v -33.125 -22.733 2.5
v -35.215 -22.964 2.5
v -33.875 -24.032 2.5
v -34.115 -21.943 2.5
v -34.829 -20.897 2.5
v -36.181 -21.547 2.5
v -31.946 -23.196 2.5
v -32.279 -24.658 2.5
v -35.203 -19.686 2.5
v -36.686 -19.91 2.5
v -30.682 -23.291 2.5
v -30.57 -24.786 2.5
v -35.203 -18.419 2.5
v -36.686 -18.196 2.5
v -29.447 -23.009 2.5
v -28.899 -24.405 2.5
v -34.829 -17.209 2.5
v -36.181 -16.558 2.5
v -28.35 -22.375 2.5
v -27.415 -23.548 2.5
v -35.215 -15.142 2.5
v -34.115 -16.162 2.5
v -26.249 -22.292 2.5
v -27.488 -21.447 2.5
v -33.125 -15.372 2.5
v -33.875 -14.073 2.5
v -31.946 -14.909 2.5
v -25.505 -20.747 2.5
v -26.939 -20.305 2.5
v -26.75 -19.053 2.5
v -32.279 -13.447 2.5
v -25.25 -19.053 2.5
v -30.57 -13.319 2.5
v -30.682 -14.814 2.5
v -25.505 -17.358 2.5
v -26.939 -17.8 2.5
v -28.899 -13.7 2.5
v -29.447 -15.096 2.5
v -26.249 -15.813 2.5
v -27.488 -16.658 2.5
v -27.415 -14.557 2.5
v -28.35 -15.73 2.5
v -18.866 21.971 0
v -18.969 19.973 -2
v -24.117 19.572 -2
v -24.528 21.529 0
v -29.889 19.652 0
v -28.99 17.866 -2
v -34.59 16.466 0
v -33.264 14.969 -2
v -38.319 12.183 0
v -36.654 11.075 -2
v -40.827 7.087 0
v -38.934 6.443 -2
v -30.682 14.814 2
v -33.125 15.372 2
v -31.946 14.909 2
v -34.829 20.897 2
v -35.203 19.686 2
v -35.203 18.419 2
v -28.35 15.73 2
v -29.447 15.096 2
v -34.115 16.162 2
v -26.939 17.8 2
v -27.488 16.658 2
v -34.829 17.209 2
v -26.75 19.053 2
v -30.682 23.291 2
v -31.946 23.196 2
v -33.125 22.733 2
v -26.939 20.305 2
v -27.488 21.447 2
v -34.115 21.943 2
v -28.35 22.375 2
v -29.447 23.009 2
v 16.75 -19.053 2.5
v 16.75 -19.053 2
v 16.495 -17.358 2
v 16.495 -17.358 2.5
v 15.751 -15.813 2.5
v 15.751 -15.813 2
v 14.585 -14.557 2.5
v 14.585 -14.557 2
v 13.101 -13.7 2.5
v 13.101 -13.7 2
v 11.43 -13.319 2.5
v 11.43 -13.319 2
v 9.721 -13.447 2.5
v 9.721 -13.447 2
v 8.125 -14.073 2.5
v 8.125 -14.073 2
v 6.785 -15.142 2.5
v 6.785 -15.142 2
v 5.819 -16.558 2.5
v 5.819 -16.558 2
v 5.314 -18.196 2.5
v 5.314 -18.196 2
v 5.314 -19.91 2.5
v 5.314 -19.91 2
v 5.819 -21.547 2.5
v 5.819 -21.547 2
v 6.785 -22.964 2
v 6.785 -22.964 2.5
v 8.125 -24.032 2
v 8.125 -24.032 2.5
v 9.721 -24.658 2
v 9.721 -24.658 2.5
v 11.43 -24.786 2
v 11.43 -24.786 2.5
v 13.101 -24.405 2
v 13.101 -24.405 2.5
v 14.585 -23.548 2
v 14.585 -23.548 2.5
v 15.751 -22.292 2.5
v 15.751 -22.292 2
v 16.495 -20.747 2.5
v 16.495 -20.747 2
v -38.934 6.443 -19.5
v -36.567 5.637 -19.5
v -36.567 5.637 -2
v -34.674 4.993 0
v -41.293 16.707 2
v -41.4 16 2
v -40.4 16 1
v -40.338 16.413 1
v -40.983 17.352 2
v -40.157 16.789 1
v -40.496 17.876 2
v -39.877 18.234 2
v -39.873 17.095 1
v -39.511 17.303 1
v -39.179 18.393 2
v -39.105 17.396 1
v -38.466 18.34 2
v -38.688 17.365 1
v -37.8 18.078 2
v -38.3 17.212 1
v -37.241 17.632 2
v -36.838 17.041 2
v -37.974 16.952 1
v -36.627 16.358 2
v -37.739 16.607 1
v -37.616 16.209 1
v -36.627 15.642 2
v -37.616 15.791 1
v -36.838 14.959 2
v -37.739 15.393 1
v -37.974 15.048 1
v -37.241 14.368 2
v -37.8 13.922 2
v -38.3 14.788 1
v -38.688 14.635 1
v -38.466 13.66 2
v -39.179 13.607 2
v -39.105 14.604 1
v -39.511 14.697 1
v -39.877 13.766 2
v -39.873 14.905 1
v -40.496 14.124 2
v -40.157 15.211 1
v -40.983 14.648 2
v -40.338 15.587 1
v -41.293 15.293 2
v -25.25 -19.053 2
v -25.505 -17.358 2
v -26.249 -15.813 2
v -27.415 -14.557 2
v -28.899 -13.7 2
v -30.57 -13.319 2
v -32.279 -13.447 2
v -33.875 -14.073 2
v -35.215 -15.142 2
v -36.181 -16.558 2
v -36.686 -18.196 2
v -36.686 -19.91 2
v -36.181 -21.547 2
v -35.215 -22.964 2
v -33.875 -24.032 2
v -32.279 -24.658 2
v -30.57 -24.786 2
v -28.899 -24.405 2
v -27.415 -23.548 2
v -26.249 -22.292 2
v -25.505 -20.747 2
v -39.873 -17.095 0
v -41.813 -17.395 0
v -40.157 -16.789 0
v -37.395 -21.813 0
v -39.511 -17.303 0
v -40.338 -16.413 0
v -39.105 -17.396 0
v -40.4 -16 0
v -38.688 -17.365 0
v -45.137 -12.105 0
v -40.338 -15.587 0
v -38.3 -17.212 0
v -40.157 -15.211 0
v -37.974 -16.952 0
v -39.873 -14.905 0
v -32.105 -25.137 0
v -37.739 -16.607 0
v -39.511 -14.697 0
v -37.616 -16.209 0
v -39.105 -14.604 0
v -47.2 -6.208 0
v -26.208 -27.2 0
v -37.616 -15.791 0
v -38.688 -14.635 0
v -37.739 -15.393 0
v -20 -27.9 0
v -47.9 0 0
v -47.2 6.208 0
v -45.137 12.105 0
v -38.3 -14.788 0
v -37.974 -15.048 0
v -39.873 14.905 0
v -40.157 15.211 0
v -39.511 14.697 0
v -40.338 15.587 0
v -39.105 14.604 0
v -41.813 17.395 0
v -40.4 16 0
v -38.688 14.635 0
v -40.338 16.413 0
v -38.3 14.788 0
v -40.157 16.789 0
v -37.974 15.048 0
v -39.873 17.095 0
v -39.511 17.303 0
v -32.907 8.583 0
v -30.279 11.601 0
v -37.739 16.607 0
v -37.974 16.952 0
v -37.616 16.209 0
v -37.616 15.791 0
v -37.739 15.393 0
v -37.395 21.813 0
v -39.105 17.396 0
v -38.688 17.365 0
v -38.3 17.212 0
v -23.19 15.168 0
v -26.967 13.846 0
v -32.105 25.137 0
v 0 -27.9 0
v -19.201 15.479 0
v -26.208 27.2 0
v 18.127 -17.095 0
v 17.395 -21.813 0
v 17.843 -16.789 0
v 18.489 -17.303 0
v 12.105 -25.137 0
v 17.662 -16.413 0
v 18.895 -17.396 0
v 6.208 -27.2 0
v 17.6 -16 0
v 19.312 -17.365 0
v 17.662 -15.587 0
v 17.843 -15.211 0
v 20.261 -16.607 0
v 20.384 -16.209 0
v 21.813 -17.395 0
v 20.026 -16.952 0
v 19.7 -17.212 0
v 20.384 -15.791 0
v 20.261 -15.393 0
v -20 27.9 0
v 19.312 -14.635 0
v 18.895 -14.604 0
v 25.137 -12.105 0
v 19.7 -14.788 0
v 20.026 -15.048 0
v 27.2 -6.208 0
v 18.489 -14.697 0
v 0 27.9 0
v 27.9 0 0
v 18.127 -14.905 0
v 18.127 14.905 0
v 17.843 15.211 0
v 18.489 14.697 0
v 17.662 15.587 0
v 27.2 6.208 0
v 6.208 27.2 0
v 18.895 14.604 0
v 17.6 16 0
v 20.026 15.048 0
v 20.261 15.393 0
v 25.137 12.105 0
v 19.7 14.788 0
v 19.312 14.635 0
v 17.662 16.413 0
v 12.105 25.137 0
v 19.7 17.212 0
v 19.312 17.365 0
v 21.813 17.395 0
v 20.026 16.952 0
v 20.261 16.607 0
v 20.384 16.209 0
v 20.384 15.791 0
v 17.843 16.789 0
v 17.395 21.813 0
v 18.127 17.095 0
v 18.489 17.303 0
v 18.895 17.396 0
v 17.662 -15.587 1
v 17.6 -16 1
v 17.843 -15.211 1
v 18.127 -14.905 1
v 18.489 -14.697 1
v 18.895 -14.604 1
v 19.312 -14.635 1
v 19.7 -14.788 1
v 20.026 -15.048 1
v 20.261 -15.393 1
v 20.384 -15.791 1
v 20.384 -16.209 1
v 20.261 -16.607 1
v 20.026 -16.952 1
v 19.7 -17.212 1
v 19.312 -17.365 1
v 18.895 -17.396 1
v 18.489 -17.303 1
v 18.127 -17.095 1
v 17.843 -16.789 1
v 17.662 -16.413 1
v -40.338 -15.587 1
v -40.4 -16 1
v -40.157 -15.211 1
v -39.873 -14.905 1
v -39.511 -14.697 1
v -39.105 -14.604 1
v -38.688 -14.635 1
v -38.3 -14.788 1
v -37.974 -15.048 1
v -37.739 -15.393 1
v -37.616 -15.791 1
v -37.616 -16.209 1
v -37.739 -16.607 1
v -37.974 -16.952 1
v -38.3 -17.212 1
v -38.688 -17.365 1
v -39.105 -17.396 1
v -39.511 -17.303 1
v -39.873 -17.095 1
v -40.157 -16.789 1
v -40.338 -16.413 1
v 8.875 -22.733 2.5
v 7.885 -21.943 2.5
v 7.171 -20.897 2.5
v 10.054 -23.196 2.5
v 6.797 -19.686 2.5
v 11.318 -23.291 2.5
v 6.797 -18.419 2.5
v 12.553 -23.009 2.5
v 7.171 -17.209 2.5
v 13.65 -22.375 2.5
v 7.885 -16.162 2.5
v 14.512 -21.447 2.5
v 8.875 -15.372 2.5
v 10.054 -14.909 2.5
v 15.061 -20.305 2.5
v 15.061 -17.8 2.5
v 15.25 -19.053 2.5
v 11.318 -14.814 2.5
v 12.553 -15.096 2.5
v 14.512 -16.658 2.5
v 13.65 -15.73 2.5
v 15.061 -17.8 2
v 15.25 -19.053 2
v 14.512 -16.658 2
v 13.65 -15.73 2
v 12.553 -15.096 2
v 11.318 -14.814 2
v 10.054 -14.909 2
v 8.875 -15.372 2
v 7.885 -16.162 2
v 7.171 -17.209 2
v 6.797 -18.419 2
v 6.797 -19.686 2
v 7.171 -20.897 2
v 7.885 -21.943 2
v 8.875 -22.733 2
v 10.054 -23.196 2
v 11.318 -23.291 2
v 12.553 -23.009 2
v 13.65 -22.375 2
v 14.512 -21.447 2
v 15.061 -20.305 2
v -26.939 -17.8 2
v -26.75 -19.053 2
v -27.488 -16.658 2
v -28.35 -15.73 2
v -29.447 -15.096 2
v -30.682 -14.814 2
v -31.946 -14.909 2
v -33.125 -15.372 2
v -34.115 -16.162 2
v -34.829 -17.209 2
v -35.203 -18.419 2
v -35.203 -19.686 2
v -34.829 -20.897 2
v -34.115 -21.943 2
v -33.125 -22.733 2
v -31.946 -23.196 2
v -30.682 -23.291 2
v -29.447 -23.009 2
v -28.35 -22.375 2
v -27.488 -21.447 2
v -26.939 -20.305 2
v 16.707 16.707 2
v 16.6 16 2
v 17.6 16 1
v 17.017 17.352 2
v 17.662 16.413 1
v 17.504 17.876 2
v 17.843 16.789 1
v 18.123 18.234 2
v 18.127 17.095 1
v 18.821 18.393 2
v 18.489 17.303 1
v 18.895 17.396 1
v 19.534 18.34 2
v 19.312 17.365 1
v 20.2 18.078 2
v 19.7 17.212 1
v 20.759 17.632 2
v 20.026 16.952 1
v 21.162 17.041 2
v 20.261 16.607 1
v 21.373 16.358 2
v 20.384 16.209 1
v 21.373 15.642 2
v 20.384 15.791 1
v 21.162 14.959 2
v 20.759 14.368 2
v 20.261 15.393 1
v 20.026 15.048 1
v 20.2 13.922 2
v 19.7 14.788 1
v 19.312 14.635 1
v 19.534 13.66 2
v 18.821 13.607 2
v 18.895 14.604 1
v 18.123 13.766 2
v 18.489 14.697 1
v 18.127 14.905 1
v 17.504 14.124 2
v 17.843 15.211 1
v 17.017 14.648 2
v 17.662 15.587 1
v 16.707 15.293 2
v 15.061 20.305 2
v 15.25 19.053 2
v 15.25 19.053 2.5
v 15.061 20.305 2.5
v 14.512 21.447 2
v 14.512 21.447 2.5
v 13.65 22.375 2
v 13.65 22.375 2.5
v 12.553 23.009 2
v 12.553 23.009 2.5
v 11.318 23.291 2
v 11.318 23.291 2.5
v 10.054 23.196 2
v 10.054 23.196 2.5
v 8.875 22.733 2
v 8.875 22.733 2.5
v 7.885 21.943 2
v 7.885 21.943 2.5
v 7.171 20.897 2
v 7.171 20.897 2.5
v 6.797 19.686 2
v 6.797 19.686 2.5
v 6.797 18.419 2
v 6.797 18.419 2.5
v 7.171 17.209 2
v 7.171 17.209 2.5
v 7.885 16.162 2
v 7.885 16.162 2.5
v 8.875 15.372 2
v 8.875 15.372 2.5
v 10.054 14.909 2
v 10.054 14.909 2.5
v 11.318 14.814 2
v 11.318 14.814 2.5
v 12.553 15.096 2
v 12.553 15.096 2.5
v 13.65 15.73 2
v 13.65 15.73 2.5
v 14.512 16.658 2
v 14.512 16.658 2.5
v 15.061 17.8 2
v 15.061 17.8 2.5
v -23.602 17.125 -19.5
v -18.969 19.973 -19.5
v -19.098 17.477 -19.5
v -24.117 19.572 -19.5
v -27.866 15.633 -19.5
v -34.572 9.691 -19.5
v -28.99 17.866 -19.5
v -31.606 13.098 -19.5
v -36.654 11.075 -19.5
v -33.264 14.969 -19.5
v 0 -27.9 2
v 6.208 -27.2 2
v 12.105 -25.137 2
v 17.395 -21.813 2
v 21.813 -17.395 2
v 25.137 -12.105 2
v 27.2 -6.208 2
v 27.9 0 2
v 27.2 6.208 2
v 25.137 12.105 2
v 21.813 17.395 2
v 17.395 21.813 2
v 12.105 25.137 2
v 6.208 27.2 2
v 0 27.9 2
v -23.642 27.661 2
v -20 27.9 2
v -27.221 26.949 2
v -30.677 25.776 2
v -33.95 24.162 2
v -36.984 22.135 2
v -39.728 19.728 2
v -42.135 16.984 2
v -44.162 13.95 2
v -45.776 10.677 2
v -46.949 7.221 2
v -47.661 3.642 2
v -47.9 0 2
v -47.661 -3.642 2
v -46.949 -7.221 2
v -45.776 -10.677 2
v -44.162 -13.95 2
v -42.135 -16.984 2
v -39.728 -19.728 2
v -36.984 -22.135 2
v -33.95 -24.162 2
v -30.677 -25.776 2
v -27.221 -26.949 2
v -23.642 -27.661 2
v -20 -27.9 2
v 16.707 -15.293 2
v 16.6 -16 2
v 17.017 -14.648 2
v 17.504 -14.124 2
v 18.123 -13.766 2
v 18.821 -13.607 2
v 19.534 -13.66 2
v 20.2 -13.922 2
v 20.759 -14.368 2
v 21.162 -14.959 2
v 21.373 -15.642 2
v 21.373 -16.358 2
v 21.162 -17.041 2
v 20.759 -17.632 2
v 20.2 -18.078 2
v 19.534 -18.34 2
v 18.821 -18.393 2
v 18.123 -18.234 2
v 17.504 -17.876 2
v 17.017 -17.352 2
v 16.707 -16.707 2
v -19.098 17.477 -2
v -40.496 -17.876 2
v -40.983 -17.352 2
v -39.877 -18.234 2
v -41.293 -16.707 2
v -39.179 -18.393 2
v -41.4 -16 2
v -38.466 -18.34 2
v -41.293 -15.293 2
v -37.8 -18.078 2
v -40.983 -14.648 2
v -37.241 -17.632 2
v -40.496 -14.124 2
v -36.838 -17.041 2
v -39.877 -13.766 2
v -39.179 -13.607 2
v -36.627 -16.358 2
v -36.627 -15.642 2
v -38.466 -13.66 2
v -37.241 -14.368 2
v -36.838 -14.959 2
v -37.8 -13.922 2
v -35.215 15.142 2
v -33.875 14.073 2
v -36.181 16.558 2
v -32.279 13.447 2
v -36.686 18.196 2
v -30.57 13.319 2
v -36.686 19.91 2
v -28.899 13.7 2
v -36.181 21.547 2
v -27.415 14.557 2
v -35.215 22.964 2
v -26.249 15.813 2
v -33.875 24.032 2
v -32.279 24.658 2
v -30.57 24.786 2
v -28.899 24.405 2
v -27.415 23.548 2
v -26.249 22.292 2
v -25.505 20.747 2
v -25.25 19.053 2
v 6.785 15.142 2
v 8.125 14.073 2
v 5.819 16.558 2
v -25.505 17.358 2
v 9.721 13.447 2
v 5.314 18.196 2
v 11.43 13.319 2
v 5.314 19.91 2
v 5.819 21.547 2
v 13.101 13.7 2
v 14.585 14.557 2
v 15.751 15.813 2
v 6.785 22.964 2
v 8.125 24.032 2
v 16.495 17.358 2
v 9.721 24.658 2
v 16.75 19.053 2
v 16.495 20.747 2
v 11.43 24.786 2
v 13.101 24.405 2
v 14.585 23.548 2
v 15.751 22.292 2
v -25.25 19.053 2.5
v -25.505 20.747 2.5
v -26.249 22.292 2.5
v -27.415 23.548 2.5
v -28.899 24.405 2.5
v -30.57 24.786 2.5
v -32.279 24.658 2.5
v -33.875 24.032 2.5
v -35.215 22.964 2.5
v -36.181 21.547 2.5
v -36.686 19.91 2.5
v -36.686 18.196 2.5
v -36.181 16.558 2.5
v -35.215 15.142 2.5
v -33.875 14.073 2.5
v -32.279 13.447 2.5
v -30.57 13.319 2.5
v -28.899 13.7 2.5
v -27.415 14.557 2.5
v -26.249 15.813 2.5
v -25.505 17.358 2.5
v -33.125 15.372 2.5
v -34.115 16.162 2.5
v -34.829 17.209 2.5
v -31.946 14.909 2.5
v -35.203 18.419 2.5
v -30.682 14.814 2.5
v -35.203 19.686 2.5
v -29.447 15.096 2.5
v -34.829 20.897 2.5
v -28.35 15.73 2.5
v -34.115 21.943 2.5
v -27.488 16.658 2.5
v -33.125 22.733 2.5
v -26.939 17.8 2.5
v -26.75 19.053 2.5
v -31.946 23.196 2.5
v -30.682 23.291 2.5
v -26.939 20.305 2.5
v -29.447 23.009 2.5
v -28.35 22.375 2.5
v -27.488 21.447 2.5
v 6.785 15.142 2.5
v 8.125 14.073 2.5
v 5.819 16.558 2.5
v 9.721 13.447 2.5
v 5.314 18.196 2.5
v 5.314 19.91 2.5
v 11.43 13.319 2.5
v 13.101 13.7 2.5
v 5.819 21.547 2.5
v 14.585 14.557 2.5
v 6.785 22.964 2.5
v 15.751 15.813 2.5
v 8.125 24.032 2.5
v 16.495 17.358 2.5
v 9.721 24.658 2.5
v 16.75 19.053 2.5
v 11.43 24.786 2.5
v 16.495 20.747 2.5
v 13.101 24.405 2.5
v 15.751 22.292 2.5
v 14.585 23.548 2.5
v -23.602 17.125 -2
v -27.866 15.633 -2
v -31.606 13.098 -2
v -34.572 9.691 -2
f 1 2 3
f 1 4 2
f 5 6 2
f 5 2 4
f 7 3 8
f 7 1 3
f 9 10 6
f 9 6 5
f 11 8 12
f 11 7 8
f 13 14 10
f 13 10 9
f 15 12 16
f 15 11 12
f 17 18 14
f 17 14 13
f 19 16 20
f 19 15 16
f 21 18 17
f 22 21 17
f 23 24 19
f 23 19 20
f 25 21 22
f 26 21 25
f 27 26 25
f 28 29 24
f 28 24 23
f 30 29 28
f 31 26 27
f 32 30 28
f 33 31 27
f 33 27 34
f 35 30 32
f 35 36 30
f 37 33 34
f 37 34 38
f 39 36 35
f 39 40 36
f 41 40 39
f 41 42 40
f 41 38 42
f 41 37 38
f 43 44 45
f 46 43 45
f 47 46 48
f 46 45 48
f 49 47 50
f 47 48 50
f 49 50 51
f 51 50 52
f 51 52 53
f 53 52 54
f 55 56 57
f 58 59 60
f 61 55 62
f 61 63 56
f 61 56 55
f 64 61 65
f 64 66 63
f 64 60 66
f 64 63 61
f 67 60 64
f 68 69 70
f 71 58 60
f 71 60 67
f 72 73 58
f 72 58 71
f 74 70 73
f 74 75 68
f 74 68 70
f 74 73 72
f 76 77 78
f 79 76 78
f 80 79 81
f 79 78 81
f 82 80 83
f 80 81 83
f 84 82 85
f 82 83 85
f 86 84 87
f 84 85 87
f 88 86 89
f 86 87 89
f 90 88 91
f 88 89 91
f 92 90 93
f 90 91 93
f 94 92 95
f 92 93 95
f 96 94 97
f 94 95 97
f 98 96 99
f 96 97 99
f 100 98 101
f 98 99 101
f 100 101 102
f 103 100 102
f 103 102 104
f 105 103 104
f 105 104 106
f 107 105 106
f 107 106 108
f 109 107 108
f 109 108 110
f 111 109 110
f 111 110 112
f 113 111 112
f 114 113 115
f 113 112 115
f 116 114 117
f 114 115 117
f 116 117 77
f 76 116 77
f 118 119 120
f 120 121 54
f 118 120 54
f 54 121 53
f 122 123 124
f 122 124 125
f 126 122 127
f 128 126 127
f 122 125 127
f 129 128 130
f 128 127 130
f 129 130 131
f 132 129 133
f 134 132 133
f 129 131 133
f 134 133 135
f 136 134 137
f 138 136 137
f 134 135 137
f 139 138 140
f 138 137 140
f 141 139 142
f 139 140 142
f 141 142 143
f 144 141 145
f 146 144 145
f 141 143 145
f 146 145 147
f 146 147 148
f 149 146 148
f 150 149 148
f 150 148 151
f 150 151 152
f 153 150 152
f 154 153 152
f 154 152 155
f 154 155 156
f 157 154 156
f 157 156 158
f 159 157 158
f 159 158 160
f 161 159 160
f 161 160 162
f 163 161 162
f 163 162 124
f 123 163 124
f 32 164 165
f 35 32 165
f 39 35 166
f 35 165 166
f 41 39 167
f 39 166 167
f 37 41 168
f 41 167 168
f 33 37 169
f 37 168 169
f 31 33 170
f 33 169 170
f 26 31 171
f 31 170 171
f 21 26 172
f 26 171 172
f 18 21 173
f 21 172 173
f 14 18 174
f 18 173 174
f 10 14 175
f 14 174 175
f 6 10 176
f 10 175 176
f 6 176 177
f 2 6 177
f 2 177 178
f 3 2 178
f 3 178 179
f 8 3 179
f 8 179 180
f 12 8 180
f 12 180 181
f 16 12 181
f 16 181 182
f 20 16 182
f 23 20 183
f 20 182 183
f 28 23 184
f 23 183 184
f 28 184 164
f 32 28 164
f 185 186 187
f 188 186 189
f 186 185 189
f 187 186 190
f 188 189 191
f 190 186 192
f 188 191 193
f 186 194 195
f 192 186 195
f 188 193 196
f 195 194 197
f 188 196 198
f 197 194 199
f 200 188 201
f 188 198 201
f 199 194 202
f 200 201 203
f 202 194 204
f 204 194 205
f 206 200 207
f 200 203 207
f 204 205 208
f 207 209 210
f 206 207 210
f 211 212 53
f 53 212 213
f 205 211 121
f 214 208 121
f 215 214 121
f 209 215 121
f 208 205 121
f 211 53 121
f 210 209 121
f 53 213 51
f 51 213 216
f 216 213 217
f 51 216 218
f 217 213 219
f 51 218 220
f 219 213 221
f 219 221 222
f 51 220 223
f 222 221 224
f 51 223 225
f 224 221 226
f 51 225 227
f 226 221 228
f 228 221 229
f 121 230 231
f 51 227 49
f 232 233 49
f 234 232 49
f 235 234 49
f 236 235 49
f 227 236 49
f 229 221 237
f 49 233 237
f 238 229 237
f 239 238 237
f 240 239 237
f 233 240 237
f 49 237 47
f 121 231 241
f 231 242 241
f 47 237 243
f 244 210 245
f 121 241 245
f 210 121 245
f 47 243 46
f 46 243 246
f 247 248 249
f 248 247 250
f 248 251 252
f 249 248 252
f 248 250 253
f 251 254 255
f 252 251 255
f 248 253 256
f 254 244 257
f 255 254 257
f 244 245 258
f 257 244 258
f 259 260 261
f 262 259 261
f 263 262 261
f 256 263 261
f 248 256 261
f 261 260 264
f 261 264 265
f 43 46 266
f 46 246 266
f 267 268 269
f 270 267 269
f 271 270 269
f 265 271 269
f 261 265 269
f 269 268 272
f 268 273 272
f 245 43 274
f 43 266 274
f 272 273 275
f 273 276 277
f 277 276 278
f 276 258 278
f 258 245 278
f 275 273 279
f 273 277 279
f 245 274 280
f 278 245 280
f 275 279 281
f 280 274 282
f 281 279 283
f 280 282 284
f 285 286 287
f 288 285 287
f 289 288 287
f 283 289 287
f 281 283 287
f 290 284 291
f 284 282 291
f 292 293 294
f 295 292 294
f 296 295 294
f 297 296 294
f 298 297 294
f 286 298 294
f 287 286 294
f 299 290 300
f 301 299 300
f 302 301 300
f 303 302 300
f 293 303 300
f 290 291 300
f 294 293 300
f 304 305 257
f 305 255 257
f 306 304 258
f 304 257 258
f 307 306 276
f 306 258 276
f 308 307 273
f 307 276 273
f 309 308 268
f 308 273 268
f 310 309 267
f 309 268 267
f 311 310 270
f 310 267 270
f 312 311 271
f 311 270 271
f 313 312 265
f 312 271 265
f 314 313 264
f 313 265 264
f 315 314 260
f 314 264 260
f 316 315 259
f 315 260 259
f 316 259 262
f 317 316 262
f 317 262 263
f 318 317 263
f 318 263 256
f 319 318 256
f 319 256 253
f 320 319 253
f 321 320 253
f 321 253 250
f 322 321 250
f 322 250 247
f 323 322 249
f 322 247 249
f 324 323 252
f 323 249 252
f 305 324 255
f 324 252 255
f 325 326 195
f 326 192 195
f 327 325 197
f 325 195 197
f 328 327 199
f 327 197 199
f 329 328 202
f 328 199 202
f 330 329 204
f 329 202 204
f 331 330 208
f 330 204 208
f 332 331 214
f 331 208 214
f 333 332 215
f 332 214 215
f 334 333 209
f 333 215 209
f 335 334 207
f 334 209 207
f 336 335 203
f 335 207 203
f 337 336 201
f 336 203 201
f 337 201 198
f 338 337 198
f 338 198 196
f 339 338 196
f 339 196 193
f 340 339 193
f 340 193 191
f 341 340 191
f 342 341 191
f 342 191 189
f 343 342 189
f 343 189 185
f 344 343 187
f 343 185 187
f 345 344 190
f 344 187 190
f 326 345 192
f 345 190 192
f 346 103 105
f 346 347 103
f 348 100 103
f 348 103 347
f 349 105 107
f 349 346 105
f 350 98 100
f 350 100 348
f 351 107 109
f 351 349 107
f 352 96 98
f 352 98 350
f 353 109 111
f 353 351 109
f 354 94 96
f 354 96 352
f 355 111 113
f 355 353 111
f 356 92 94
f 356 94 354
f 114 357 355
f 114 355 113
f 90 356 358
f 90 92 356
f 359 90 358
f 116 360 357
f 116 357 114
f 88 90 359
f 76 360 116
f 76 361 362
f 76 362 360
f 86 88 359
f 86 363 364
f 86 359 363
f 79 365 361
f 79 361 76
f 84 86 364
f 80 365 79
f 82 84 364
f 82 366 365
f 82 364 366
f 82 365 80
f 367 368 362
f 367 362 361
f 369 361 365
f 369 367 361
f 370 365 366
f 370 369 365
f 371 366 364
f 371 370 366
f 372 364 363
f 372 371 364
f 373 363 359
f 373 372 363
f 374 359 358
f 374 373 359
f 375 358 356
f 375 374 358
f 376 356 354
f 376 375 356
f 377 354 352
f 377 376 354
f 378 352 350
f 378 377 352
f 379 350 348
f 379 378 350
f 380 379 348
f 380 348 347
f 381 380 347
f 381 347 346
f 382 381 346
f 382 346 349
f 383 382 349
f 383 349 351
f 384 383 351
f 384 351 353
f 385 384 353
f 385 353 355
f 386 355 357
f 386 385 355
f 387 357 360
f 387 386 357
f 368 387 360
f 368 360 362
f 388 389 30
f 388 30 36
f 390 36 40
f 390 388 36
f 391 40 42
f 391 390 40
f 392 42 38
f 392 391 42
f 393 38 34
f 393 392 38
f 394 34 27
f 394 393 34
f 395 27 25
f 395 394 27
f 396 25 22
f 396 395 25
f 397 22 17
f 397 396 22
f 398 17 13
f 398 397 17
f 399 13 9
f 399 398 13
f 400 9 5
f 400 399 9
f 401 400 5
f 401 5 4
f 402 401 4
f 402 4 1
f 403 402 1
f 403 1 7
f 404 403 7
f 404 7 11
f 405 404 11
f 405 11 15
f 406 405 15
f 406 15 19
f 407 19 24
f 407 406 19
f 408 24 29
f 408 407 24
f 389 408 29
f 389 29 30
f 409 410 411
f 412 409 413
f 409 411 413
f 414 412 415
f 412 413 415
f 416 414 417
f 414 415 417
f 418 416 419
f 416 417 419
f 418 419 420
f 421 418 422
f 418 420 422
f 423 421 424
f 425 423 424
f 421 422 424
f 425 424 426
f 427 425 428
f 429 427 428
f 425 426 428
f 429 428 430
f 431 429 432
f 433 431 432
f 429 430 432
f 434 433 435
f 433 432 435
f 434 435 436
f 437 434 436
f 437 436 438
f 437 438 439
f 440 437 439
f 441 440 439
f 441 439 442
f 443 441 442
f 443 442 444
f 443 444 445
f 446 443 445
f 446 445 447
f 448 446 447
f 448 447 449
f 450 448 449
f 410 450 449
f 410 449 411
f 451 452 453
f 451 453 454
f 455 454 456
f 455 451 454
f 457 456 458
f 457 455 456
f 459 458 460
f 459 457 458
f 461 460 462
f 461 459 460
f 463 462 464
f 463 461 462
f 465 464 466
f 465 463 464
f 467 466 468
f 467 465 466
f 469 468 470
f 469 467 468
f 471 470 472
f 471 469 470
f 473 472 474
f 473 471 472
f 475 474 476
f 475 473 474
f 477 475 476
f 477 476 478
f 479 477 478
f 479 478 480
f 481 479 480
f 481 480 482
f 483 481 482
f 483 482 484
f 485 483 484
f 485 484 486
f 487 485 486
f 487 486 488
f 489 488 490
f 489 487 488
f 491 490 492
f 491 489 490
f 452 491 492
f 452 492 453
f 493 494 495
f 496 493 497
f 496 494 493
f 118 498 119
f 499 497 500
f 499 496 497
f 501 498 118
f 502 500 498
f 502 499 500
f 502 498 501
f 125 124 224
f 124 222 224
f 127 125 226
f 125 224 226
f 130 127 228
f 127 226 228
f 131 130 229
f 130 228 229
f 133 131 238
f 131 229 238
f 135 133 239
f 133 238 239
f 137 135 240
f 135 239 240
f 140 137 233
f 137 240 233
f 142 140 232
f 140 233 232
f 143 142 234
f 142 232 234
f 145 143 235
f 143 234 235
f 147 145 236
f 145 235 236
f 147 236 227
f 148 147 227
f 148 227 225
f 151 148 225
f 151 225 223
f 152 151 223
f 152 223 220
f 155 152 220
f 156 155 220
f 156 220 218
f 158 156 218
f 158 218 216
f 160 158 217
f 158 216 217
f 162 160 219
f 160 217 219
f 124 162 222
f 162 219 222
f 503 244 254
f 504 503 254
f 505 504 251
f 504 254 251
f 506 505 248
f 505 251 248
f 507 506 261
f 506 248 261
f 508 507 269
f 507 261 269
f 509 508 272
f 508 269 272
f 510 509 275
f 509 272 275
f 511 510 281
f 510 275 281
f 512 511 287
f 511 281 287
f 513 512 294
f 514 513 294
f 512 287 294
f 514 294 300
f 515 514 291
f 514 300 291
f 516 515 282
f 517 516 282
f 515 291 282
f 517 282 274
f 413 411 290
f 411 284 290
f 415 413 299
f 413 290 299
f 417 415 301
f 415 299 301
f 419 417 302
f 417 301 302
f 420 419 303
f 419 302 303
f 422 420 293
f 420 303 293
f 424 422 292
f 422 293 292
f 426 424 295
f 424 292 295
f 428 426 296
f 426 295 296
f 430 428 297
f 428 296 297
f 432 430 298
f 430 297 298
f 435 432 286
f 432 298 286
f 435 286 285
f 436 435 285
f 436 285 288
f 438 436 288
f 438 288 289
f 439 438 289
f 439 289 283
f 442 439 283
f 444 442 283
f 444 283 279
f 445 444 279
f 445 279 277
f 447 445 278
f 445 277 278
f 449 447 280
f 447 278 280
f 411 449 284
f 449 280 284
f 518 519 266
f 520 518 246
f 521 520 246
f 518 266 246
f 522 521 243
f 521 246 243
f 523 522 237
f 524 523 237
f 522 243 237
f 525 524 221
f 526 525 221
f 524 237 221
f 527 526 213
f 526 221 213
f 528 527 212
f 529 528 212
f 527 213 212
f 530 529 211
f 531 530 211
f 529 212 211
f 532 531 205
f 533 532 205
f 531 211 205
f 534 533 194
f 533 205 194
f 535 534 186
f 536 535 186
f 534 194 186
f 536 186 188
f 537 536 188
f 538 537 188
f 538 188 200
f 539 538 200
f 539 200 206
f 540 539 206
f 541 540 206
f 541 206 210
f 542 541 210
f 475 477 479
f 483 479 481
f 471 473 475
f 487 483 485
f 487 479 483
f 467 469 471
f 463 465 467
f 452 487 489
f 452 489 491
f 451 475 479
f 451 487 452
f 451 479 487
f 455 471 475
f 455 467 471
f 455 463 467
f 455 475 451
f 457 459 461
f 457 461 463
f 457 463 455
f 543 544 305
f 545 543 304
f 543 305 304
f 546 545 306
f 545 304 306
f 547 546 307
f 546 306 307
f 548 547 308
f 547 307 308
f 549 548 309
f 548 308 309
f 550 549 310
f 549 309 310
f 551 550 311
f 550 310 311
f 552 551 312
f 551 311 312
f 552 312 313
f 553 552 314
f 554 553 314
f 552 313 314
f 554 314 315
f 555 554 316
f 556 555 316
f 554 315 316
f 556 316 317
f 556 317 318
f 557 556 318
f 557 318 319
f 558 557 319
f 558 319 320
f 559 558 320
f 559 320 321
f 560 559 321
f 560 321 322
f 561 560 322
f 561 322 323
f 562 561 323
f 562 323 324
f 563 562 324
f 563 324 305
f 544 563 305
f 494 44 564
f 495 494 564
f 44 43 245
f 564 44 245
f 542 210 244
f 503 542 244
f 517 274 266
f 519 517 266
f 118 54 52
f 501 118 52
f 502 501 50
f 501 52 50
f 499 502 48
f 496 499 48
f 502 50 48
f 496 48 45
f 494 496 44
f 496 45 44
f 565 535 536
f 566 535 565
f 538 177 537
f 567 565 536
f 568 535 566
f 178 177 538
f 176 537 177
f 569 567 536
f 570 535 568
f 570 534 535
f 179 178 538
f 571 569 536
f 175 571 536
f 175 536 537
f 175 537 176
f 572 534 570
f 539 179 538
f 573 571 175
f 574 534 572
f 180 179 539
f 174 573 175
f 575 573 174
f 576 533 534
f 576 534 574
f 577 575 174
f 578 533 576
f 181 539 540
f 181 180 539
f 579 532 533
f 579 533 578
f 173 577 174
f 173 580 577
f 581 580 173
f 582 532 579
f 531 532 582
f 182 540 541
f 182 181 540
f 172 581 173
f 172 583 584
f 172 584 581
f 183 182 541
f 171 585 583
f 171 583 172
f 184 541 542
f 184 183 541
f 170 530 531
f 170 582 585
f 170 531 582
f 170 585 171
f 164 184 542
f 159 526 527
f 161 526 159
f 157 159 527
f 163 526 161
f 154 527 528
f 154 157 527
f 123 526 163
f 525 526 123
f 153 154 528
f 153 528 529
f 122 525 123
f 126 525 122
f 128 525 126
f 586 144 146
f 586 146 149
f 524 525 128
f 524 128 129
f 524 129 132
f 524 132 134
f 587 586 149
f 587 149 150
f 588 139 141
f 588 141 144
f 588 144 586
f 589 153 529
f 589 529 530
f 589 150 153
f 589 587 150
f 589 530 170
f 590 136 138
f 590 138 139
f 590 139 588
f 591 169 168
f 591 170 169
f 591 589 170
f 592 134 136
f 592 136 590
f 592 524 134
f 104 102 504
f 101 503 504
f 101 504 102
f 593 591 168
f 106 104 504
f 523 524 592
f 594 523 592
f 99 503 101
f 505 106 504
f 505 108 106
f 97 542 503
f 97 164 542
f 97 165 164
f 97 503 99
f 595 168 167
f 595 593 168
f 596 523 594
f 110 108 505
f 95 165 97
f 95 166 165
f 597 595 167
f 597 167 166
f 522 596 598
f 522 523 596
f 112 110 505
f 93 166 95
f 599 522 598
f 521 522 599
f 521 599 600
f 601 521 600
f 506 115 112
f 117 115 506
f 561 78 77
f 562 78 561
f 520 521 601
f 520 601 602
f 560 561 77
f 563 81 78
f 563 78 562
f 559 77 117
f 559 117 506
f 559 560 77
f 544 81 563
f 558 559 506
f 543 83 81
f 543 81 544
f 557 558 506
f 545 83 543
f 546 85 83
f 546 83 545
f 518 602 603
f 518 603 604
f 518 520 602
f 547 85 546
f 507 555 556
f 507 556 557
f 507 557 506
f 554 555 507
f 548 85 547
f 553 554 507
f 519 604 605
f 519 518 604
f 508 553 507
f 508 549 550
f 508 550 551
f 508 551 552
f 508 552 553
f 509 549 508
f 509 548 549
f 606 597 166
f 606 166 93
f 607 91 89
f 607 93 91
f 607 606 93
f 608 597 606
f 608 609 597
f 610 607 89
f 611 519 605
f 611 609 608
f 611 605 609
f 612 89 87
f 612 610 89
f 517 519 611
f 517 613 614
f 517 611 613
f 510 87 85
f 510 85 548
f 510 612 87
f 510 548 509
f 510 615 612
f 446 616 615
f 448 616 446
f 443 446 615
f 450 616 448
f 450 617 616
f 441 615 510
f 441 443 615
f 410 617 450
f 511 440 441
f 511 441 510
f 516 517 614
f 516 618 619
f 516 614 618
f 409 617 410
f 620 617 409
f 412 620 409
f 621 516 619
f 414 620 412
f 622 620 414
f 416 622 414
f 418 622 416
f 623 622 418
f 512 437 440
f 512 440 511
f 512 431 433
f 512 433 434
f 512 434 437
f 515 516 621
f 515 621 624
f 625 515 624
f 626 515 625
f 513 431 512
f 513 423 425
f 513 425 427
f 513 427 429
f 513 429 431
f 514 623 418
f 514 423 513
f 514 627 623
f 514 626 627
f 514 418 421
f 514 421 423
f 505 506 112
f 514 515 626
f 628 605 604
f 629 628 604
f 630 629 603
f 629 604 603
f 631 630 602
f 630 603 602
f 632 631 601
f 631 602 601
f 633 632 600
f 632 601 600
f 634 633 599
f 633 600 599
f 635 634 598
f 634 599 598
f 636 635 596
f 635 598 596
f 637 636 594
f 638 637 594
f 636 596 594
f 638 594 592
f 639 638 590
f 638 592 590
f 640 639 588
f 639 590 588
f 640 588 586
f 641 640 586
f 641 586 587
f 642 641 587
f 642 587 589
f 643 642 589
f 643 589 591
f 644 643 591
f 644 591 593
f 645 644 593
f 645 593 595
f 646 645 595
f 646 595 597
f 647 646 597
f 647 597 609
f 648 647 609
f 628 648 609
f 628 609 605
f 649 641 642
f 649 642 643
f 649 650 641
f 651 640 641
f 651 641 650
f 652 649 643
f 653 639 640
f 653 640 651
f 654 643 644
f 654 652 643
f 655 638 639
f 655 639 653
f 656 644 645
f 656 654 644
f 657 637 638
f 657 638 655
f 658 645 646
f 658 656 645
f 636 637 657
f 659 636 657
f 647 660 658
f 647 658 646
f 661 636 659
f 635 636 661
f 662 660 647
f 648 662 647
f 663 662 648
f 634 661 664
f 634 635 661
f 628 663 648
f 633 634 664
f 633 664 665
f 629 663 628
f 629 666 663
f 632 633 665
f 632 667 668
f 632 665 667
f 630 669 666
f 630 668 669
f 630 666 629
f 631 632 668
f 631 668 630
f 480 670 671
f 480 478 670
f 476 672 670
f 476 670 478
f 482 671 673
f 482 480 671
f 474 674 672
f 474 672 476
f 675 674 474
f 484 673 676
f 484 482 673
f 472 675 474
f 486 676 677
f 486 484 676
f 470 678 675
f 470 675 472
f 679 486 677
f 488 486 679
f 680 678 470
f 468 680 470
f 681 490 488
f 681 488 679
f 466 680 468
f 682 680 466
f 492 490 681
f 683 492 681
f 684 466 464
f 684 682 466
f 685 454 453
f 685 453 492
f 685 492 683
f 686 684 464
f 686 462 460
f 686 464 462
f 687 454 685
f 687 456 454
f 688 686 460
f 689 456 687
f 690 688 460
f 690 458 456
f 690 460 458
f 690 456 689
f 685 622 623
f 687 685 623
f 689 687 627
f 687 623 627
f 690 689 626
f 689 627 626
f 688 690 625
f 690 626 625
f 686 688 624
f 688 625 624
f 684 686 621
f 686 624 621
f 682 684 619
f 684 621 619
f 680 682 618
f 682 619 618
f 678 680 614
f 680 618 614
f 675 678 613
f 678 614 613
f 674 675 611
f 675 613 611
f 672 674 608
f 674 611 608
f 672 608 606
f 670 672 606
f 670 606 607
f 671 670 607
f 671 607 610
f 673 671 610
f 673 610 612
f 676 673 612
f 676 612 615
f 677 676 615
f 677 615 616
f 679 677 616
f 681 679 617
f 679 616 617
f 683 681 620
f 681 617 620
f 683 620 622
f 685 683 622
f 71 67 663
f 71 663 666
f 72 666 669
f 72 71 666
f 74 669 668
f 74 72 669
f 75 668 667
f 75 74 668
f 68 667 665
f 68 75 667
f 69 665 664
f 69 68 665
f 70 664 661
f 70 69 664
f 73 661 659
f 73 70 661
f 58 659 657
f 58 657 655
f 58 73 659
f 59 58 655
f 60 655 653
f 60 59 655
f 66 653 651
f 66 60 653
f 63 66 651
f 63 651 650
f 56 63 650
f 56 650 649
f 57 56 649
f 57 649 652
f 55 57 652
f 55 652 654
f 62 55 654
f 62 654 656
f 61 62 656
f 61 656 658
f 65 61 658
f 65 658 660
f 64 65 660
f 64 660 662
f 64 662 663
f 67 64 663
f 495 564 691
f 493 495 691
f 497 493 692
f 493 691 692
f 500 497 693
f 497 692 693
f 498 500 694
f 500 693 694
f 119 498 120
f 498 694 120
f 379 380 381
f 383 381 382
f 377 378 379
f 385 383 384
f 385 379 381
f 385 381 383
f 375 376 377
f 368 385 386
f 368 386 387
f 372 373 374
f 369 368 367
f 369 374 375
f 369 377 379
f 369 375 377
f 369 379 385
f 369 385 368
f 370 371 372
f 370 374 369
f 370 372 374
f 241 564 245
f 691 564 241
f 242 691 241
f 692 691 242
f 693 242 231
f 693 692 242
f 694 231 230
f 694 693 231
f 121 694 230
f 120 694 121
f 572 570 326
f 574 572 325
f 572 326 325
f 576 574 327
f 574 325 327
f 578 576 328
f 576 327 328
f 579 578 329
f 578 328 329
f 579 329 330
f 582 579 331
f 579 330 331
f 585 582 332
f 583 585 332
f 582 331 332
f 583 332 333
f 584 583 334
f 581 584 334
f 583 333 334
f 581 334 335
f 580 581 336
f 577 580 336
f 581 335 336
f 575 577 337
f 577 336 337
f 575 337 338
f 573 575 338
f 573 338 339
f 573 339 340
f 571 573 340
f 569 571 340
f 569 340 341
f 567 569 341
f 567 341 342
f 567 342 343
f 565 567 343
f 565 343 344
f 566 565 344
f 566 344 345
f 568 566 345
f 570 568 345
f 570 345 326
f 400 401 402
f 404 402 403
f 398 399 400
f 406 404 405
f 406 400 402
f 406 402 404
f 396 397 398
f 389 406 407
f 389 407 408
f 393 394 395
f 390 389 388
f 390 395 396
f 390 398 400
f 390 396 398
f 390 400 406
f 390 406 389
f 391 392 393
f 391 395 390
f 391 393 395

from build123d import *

# Parameters (mm, degrees)
EXTRUDE_1_DEPTH           = 2
HOLE_WIZARD_1_D           = 2.8
HOLE_WIZARD_1_DEPTH       = 7.5
HOLE_WIZARD_1_CSINK_D     = 4.8
HOLE_WIZARD_1_CSINK_ANGLE = 90
HOLE_WIZARD_1_TIP         = 0.841204867
SKETCH_4_R                = 5.75
SKETCH_4_R_2              = 4.25
EXTRUDE_1_2_DEPTH         = 0.5
EXTRUDE_2_DEPTH           = 21.5
CHAMFER_1_SIZE            = 2


with BuildPart() as part:
    # 草图1 → Extrude 1 (new body)
    with BuildSketch(Plane.XY):
        with BuildLine():
            Line((-20, -27.9), (0, -27.9))
            ThreePointArc((0, -27.9), (27.9, 0), (0, 27.9))
            Line((0, 27.9), (-20, 27.9))
            ThreePointArc((-20, 27.9), (-47.9, 0), (-20, -27.9))
        make_face()
    extrude(amount=EXTRUDE_1_DEPTH)

    # 打孔尺寸(%根据十字)槽沉头自攻螺钉的类型1
    with Locations(Plane.XY.offset(2)):
        with Locations((-39, 16), (-39, -16), (19, 16), (19, -16), (-60.528138983, 2.67584761), (-55.747291253, 1.462796694)):
            CounterSinkHole(HOLE_WIZARD_1_D / 2, HOLE_WIZARD_1_CSINK_D / 2, depth=HOLE_WIZARD_1_DEPTH, counter_sink_angle=HOLE_WIZARD_1_CSINK_ANGLE)
            with Locations((0, 0, -(HOLE_WIZARD_1_DEPTH + HOLE_WIZARD_1_TIP / 2))):  # 118° drill point
                Cone(0, HOLE_WIZARD_1_D / 2, HOLE_WIZARD_1_TIP, mode=Mode.SUBTRACT)

    # 草图4 → Extrude 1 2 (add)
    # profile 1 of 4: a face of its own
    with BuildSketch(Plane.XY.offset(2)):
        with Locations((11, -19.052558883)):
            Circle(SKETCH_4_R)
        with Locations((11, -19.052558883)):
            Circle(SKETCH_4_R_2, mode=Mode.SUBTRACT)
    # profile 2 of 4: a face of its own
    with BuildSketch(Plane.XY.offset(2)):
        with Locations((11, 19.052558883)):
            Circle(SKETCH_4_R)
        with Locations((11, 19.052558883)):
            Circle(SKETCH_4_R_2, mode=Mode.SUBTRACT)
    # profile 3 of 4: a face of its own
    with BuildSketch(Plane.XY.offset(2)):
        with Locations((-31, 19.052558883)):
            Circle(SKETCH_4_R)
        with Locations((-31, 19.052558883)):
            Circle(SKETCH_4_R_2, mode=Mode.SUBTRACT)
    # profile 4 of 4: a face of its own
    with BuildSketch(Plane.XY.offset(2)):
        with Locations((-31, -19.052558883)):
            Circle(SKETCH_4_R)
        with Locations((-31, -19.052558883)):
            Circle(SKETCH_4_R_2, mode=Mode.SUBTRACT)
    extrude(amount=EXTRUDE_1_2_DEPTH)

    # 草图5 → 拉伸-薄壁2 (add)
    with BuildSketch(Plane.XY.offset(2)):
        with BuildLine():
            ThreePointArc((-38.933849158, 6.442775494), (-31.220488522, 16.55598494), (-18.969199414, 19.973418589))
            Line((-18.969199414, 19.973418589), (-19.098049487, 17.476741266))
            ThreePointArc((-19.098049487, 17.476741266), (-29.817927457, 14.486486822), (-36.567118013, 5.637428557))
            Line((-36.567118013, 5.637428557), (-38.933849158, 6.442775494))
        make_face()
    extrude(amount=-EXTRUDE_2_DEPTH)

    # 倒角1
    chamfer_1_edges = [part.edges().sort_by_distance(p)[0] for p in [
        (-31.220488522, 16.55598494, 0),
        (-29.817927457, 14.486486822, 0),
    ]]
    chamfer(chamfer_1_edges, length=CHAMFER_1_SIZE)


solid = part.part
